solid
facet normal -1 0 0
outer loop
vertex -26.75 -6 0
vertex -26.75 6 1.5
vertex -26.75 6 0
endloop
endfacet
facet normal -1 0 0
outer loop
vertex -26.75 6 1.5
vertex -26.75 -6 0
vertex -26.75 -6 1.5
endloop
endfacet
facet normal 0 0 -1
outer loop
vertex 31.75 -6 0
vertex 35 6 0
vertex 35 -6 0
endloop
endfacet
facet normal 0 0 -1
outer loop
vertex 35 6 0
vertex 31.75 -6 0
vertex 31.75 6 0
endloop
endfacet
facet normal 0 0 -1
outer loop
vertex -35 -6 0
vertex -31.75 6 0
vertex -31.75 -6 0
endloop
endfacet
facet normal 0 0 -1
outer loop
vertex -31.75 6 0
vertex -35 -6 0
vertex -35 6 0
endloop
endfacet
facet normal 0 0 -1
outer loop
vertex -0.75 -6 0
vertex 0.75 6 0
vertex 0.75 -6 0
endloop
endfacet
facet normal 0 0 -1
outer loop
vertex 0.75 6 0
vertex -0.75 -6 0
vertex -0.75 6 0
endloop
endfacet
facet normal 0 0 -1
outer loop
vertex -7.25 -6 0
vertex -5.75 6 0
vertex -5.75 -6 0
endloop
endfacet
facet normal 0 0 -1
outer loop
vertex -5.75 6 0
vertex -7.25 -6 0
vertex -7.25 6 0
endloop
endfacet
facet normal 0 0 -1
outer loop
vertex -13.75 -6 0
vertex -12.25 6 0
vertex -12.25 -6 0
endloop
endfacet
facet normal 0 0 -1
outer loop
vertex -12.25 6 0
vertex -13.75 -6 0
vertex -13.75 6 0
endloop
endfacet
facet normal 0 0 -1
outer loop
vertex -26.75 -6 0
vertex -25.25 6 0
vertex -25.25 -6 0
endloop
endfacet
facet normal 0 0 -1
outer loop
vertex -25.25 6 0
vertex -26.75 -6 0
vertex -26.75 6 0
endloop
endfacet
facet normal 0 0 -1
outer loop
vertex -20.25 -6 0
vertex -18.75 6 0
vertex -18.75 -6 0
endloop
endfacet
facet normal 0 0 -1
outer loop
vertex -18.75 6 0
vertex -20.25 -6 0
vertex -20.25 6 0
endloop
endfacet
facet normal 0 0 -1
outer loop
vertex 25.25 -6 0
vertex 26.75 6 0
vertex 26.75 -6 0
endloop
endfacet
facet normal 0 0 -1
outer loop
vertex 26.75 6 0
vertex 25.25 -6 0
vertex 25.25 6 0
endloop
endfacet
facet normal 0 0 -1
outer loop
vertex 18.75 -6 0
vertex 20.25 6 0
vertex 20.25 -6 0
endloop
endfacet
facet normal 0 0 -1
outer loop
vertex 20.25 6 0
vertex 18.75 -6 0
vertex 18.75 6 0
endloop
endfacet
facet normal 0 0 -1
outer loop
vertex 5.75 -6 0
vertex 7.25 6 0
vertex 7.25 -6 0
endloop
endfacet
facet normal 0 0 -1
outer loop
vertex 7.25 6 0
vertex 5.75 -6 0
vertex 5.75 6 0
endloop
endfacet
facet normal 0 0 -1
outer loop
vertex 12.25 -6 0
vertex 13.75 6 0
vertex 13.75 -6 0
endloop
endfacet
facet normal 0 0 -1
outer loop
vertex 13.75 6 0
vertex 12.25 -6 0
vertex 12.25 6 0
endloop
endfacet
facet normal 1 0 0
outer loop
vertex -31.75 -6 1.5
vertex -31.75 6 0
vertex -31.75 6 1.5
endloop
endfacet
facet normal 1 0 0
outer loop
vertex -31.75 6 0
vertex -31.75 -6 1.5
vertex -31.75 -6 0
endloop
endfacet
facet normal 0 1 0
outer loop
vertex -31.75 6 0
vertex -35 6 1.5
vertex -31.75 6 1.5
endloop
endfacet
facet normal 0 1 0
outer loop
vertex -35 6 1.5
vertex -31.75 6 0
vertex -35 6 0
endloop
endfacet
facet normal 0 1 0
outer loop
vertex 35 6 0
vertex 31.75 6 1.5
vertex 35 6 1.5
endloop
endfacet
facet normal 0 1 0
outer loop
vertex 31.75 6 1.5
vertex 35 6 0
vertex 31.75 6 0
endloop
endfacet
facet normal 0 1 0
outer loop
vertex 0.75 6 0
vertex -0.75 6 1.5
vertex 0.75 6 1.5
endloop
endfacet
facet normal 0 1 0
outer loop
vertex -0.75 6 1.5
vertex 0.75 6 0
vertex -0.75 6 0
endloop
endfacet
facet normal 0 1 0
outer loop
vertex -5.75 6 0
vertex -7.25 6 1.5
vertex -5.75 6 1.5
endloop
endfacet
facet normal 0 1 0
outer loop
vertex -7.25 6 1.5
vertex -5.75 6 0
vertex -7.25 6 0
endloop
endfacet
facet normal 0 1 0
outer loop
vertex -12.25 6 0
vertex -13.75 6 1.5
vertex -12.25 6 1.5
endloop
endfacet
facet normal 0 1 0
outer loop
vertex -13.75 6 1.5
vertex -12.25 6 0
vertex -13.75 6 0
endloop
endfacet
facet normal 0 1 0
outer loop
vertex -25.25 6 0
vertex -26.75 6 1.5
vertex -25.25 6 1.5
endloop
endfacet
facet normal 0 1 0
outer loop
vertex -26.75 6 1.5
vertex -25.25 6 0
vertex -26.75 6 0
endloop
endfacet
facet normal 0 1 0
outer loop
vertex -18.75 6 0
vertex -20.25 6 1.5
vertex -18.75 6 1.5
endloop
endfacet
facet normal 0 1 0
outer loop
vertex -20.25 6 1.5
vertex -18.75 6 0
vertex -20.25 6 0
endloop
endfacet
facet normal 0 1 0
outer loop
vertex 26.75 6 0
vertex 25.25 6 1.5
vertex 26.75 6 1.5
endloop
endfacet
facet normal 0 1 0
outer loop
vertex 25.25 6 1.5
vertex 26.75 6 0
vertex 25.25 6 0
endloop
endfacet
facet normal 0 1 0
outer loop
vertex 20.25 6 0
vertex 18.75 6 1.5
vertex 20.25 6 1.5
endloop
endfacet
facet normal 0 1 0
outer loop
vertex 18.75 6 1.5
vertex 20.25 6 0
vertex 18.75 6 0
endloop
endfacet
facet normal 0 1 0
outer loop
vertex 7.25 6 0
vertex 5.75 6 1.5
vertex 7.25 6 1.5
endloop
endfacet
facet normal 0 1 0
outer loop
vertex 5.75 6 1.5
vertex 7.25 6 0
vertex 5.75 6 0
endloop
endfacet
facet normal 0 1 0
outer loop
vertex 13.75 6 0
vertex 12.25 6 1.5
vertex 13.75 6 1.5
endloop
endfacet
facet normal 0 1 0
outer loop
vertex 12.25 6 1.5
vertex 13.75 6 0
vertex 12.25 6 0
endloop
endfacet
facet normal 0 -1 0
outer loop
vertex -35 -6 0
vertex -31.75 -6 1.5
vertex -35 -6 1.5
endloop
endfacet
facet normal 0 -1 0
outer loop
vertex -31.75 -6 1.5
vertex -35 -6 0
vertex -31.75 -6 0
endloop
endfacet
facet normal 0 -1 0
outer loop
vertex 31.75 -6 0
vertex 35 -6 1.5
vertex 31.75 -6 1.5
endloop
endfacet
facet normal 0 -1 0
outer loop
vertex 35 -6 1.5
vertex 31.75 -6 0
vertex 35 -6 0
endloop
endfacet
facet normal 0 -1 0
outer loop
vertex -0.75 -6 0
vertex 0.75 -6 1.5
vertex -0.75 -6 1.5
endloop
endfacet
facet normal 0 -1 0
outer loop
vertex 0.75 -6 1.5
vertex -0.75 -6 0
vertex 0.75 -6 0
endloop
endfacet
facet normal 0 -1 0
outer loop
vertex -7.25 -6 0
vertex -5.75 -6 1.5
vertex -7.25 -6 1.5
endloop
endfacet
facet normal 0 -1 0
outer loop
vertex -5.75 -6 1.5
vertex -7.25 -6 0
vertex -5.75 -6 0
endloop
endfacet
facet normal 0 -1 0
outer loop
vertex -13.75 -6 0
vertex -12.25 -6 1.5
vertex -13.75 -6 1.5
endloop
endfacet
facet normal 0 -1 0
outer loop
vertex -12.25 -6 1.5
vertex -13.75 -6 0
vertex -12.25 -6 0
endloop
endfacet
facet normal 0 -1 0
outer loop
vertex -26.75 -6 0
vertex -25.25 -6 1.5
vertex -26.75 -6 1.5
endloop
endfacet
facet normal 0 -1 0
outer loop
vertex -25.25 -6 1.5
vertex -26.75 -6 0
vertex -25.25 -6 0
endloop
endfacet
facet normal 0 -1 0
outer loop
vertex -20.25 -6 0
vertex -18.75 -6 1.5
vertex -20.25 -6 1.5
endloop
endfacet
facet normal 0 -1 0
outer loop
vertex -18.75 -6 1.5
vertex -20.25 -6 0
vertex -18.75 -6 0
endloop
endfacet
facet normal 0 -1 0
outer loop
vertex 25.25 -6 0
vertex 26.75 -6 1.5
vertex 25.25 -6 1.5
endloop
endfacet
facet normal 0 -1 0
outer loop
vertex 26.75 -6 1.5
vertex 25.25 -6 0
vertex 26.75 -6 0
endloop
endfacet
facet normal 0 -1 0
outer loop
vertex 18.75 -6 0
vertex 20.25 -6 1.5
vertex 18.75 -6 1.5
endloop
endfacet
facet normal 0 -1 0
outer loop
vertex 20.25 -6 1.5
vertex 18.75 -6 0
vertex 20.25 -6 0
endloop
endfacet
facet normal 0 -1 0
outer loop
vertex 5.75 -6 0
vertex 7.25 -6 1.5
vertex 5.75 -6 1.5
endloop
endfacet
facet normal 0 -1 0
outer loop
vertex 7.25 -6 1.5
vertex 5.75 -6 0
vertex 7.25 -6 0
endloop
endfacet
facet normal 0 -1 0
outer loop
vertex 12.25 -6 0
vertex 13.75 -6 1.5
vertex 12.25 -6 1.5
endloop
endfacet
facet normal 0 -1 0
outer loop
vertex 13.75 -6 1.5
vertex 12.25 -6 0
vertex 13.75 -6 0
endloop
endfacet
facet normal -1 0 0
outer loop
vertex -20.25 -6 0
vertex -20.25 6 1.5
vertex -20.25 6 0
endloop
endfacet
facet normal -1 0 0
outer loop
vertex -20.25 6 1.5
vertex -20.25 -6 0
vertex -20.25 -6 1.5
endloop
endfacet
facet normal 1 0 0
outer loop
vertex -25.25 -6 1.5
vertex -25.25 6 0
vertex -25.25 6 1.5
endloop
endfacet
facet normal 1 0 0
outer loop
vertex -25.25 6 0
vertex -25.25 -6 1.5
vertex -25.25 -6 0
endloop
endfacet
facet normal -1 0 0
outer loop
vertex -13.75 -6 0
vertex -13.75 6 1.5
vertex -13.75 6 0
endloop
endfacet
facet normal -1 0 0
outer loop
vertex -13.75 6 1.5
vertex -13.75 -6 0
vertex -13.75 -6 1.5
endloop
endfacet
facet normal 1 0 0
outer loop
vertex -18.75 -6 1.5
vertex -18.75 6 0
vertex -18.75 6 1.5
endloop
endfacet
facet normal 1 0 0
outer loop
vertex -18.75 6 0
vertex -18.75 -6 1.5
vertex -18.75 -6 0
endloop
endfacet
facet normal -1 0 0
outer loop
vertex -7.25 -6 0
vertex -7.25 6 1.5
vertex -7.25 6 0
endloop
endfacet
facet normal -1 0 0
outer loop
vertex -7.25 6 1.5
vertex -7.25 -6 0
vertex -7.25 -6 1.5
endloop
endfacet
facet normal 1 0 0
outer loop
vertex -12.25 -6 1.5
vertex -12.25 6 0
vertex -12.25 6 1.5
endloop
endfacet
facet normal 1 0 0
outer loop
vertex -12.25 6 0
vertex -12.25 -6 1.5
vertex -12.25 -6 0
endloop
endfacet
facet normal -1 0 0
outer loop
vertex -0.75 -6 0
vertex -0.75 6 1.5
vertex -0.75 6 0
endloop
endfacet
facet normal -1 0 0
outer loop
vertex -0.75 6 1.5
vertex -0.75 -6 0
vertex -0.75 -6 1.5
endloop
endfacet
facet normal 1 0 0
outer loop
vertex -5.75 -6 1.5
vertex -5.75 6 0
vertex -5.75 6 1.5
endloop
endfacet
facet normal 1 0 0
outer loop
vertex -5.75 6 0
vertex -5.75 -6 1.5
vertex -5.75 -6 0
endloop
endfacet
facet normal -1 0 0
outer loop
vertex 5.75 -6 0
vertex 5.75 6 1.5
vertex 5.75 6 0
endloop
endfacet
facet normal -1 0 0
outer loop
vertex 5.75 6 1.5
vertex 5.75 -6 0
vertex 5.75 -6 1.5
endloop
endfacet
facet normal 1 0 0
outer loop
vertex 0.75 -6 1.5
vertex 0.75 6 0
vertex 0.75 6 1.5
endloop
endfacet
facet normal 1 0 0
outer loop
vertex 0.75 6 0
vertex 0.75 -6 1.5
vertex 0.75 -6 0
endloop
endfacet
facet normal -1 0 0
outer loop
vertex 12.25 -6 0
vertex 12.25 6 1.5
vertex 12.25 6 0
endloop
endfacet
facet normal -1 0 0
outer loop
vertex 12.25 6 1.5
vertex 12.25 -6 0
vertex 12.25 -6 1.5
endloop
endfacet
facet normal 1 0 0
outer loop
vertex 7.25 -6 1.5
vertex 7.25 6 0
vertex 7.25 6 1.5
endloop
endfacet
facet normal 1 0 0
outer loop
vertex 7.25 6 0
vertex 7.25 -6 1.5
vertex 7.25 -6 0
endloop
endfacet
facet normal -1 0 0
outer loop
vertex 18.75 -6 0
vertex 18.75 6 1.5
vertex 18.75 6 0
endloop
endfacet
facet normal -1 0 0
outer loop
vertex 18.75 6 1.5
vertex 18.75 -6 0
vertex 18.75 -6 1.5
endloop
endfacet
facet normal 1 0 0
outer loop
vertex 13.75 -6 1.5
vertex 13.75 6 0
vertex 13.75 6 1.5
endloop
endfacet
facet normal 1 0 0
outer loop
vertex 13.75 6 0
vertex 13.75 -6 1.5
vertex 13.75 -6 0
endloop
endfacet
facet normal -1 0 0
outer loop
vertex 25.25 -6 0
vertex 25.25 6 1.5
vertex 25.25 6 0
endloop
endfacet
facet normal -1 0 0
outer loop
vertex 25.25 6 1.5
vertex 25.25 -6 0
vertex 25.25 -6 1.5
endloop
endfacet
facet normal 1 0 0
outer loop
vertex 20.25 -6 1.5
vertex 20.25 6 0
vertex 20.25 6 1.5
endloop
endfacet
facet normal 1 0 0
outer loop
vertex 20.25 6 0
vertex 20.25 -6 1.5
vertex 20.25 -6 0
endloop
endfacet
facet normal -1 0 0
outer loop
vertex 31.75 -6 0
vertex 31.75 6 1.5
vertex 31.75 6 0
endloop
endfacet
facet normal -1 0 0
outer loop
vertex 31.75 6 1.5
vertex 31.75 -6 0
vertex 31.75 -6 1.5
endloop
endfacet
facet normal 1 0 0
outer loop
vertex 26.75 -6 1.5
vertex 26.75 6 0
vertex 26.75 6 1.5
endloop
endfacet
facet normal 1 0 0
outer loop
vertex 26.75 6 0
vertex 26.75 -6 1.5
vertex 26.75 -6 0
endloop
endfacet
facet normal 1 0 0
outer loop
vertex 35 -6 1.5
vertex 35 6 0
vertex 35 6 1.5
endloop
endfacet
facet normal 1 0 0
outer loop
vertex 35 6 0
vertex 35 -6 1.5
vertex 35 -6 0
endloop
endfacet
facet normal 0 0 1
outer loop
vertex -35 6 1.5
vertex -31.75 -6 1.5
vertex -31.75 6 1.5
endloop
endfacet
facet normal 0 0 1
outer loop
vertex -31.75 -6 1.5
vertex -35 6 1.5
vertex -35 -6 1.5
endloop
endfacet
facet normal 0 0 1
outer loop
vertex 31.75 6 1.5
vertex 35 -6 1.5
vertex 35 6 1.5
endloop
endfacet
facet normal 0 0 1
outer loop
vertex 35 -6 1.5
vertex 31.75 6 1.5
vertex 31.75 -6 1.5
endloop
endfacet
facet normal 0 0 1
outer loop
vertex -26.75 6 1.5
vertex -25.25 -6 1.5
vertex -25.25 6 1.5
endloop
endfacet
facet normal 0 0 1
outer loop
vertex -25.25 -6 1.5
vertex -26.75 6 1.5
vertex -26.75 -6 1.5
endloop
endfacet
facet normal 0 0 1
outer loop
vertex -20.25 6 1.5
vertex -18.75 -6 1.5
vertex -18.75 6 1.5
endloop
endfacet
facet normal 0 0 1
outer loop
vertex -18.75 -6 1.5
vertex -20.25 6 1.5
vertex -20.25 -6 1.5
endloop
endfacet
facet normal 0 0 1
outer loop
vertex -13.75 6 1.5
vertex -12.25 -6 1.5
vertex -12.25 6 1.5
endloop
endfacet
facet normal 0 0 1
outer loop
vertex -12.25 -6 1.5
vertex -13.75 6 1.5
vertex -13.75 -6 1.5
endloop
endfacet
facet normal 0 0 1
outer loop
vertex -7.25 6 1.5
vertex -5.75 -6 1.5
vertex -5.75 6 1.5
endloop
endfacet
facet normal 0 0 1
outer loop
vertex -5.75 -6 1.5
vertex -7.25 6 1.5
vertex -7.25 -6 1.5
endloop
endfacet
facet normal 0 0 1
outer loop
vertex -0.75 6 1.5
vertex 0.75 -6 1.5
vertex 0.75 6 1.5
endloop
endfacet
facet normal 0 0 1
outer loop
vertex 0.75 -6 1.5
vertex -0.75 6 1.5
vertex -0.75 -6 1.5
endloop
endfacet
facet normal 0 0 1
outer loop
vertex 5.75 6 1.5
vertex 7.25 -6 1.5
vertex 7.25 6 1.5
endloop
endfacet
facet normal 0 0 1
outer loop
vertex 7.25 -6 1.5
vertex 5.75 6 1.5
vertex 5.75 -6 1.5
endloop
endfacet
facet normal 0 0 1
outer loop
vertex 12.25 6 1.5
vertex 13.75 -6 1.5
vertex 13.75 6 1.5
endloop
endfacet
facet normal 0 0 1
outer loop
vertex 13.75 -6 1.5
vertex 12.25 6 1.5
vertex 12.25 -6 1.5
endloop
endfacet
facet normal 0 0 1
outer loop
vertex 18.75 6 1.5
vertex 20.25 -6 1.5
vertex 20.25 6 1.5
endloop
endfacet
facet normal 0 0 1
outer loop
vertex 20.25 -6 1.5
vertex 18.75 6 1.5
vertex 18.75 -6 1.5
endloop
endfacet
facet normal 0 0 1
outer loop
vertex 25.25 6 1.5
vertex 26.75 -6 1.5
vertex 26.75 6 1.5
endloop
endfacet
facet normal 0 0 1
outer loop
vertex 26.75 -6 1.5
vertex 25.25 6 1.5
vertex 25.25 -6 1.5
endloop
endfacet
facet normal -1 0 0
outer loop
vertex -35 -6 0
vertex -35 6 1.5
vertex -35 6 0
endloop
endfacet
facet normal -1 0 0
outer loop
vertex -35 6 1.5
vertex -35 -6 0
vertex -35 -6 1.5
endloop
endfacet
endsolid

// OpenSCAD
// 10-well comb for casting agarose gels, printed lying flat
// Units: mm. Print orientation: flat on bed, teeth pointing -Y.

// ---- Spine (back bar) ----
spine_len   = 70;    // spine length along X
spine_wid   = 12;    // spine width along Y
plate_thk   = 1.5;   // plate thickness along Z

// ---- Teeth ----
tooth_count = 10;    // number of wells
tooth_w     = 5.0;   // tooth width along X
tooth_l     = 12;    // tooth length along Y
gap         = 1.5;   // gap between neighbouring teeth along X

// ---- Derived ----
row_span = (tooth_count - 1) * gap + tooth_w * tooth_count; // X span of tooth row
eps      = 0.5;       // cutter overshoot past top/bottom faces

difference() {
    // Base plate with centred spine
    translate([-spine_len/2, -spine_wid/2, 0])
        cube([spine_len, spine_wid, plate_thk]);

    // Teeth hanging in -Y from the spine's long edge
    for (i = [0 : tooth_count - 1]) {
        x = -row_span/2 + i * (tooth_w + gap);
        translate([x, -tooth_l/2, 0])
            cube([tooth_w, tooth_l, plate_thk + eps]);
    }
}
